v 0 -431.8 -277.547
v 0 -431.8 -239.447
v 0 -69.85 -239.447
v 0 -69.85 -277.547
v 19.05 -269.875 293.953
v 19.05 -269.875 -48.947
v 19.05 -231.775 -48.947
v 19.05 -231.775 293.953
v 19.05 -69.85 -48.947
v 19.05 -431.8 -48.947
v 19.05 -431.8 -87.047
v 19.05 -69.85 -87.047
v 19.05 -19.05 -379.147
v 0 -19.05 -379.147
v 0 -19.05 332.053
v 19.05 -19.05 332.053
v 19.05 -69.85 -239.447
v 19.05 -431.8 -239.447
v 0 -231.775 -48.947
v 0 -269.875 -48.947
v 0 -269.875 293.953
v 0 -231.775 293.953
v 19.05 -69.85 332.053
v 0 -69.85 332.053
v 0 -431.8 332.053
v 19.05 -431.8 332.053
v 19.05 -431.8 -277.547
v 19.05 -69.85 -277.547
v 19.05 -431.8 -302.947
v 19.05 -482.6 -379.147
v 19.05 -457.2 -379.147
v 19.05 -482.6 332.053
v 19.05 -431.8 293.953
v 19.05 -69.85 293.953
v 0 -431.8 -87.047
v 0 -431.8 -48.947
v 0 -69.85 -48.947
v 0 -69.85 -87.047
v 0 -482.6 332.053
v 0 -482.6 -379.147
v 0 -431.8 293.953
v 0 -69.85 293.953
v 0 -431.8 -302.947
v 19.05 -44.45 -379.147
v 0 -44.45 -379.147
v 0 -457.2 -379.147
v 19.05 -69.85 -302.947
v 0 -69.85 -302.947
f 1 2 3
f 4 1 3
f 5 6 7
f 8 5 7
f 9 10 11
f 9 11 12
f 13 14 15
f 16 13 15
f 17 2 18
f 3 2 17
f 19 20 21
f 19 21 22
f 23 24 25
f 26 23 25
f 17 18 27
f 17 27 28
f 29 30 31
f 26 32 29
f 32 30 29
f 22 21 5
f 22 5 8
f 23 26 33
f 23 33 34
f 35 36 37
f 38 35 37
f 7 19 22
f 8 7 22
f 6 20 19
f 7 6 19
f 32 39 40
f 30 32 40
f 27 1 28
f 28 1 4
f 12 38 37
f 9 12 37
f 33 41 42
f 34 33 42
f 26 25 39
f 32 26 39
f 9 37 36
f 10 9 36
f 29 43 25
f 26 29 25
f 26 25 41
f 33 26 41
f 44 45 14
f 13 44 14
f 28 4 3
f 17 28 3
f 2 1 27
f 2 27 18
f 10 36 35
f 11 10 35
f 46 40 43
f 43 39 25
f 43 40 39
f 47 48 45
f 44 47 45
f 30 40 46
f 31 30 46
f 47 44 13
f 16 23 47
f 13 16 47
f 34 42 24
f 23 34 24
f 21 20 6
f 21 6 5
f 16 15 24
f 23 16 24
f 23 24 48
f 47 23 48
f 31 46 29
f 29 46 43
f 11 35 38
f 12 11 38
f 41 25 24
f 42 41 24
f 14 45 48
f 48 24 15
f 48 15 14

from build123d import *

# Parameters (mm, degrees)
F0_W     = 38.1
F0_H     = 342.9
F1_DEPTH = 19.05
F0_W_2   = 361.95
F0_H_2   = 38.1
F2_DEPTH = 19.05


with BuildPart() as f1:
    # F0 (on Right) → F1 (new body)
    with BuildSketch(Plane.YZ):
        Polygon((-431.8, 293.953022), (-431.8, 332.053022), (-482.6, 332.053022), (-482.6, -379.146978), (-457.2, -379.146978), (-431.8, -302.946978), (-431.8, -277.546978), (-431.8, -239.446978), (-431.8, -87.046978), (-431.8, -48.946978), align=None)
        with Locations((-250.825, 122.503022)):
            Rectangle(F0_W, F0_H)
        Polygon((-19.05, 332.053022), (-69.85, 332.053022), (-69.85, 293.953022), (-69.85, -48.946978), (-69.85, -87.046978), (-69.85, -239.446978), (-69.85, -277.546978), (-69.85, -302.946978), (-44.45, -379.146978), (-19.05, -379.146978), align=None)
    extrude(amount=F1_DEPTH)


with BuildPart() as f2:
    # F0 (on Right) → F2 (new body)
    with BuildSketch(Plane.YZ):
        Polygon((-69.85, 332.053022), (-431.8, 332.053022), (-431.8, 293.953022), (-269.875, 293.953022), (-231.775, 293.953022), (-69.85, 293.953022), align=None)
        Polygon((-269.875, -48.946978), (-431.8, -48.946978), (-431.8, -87.046978), (-69.85, -87.046978), (-69.85, -48.946978), (-231.775, -48.946978), align=None)
        with Locations((-250.825, -258.496978)):
            Rectangle(F0_W_2, F0_H_2)
    extrude(amount=F2_DEPTH)


solid = Compound([f1.part, f2.part])
